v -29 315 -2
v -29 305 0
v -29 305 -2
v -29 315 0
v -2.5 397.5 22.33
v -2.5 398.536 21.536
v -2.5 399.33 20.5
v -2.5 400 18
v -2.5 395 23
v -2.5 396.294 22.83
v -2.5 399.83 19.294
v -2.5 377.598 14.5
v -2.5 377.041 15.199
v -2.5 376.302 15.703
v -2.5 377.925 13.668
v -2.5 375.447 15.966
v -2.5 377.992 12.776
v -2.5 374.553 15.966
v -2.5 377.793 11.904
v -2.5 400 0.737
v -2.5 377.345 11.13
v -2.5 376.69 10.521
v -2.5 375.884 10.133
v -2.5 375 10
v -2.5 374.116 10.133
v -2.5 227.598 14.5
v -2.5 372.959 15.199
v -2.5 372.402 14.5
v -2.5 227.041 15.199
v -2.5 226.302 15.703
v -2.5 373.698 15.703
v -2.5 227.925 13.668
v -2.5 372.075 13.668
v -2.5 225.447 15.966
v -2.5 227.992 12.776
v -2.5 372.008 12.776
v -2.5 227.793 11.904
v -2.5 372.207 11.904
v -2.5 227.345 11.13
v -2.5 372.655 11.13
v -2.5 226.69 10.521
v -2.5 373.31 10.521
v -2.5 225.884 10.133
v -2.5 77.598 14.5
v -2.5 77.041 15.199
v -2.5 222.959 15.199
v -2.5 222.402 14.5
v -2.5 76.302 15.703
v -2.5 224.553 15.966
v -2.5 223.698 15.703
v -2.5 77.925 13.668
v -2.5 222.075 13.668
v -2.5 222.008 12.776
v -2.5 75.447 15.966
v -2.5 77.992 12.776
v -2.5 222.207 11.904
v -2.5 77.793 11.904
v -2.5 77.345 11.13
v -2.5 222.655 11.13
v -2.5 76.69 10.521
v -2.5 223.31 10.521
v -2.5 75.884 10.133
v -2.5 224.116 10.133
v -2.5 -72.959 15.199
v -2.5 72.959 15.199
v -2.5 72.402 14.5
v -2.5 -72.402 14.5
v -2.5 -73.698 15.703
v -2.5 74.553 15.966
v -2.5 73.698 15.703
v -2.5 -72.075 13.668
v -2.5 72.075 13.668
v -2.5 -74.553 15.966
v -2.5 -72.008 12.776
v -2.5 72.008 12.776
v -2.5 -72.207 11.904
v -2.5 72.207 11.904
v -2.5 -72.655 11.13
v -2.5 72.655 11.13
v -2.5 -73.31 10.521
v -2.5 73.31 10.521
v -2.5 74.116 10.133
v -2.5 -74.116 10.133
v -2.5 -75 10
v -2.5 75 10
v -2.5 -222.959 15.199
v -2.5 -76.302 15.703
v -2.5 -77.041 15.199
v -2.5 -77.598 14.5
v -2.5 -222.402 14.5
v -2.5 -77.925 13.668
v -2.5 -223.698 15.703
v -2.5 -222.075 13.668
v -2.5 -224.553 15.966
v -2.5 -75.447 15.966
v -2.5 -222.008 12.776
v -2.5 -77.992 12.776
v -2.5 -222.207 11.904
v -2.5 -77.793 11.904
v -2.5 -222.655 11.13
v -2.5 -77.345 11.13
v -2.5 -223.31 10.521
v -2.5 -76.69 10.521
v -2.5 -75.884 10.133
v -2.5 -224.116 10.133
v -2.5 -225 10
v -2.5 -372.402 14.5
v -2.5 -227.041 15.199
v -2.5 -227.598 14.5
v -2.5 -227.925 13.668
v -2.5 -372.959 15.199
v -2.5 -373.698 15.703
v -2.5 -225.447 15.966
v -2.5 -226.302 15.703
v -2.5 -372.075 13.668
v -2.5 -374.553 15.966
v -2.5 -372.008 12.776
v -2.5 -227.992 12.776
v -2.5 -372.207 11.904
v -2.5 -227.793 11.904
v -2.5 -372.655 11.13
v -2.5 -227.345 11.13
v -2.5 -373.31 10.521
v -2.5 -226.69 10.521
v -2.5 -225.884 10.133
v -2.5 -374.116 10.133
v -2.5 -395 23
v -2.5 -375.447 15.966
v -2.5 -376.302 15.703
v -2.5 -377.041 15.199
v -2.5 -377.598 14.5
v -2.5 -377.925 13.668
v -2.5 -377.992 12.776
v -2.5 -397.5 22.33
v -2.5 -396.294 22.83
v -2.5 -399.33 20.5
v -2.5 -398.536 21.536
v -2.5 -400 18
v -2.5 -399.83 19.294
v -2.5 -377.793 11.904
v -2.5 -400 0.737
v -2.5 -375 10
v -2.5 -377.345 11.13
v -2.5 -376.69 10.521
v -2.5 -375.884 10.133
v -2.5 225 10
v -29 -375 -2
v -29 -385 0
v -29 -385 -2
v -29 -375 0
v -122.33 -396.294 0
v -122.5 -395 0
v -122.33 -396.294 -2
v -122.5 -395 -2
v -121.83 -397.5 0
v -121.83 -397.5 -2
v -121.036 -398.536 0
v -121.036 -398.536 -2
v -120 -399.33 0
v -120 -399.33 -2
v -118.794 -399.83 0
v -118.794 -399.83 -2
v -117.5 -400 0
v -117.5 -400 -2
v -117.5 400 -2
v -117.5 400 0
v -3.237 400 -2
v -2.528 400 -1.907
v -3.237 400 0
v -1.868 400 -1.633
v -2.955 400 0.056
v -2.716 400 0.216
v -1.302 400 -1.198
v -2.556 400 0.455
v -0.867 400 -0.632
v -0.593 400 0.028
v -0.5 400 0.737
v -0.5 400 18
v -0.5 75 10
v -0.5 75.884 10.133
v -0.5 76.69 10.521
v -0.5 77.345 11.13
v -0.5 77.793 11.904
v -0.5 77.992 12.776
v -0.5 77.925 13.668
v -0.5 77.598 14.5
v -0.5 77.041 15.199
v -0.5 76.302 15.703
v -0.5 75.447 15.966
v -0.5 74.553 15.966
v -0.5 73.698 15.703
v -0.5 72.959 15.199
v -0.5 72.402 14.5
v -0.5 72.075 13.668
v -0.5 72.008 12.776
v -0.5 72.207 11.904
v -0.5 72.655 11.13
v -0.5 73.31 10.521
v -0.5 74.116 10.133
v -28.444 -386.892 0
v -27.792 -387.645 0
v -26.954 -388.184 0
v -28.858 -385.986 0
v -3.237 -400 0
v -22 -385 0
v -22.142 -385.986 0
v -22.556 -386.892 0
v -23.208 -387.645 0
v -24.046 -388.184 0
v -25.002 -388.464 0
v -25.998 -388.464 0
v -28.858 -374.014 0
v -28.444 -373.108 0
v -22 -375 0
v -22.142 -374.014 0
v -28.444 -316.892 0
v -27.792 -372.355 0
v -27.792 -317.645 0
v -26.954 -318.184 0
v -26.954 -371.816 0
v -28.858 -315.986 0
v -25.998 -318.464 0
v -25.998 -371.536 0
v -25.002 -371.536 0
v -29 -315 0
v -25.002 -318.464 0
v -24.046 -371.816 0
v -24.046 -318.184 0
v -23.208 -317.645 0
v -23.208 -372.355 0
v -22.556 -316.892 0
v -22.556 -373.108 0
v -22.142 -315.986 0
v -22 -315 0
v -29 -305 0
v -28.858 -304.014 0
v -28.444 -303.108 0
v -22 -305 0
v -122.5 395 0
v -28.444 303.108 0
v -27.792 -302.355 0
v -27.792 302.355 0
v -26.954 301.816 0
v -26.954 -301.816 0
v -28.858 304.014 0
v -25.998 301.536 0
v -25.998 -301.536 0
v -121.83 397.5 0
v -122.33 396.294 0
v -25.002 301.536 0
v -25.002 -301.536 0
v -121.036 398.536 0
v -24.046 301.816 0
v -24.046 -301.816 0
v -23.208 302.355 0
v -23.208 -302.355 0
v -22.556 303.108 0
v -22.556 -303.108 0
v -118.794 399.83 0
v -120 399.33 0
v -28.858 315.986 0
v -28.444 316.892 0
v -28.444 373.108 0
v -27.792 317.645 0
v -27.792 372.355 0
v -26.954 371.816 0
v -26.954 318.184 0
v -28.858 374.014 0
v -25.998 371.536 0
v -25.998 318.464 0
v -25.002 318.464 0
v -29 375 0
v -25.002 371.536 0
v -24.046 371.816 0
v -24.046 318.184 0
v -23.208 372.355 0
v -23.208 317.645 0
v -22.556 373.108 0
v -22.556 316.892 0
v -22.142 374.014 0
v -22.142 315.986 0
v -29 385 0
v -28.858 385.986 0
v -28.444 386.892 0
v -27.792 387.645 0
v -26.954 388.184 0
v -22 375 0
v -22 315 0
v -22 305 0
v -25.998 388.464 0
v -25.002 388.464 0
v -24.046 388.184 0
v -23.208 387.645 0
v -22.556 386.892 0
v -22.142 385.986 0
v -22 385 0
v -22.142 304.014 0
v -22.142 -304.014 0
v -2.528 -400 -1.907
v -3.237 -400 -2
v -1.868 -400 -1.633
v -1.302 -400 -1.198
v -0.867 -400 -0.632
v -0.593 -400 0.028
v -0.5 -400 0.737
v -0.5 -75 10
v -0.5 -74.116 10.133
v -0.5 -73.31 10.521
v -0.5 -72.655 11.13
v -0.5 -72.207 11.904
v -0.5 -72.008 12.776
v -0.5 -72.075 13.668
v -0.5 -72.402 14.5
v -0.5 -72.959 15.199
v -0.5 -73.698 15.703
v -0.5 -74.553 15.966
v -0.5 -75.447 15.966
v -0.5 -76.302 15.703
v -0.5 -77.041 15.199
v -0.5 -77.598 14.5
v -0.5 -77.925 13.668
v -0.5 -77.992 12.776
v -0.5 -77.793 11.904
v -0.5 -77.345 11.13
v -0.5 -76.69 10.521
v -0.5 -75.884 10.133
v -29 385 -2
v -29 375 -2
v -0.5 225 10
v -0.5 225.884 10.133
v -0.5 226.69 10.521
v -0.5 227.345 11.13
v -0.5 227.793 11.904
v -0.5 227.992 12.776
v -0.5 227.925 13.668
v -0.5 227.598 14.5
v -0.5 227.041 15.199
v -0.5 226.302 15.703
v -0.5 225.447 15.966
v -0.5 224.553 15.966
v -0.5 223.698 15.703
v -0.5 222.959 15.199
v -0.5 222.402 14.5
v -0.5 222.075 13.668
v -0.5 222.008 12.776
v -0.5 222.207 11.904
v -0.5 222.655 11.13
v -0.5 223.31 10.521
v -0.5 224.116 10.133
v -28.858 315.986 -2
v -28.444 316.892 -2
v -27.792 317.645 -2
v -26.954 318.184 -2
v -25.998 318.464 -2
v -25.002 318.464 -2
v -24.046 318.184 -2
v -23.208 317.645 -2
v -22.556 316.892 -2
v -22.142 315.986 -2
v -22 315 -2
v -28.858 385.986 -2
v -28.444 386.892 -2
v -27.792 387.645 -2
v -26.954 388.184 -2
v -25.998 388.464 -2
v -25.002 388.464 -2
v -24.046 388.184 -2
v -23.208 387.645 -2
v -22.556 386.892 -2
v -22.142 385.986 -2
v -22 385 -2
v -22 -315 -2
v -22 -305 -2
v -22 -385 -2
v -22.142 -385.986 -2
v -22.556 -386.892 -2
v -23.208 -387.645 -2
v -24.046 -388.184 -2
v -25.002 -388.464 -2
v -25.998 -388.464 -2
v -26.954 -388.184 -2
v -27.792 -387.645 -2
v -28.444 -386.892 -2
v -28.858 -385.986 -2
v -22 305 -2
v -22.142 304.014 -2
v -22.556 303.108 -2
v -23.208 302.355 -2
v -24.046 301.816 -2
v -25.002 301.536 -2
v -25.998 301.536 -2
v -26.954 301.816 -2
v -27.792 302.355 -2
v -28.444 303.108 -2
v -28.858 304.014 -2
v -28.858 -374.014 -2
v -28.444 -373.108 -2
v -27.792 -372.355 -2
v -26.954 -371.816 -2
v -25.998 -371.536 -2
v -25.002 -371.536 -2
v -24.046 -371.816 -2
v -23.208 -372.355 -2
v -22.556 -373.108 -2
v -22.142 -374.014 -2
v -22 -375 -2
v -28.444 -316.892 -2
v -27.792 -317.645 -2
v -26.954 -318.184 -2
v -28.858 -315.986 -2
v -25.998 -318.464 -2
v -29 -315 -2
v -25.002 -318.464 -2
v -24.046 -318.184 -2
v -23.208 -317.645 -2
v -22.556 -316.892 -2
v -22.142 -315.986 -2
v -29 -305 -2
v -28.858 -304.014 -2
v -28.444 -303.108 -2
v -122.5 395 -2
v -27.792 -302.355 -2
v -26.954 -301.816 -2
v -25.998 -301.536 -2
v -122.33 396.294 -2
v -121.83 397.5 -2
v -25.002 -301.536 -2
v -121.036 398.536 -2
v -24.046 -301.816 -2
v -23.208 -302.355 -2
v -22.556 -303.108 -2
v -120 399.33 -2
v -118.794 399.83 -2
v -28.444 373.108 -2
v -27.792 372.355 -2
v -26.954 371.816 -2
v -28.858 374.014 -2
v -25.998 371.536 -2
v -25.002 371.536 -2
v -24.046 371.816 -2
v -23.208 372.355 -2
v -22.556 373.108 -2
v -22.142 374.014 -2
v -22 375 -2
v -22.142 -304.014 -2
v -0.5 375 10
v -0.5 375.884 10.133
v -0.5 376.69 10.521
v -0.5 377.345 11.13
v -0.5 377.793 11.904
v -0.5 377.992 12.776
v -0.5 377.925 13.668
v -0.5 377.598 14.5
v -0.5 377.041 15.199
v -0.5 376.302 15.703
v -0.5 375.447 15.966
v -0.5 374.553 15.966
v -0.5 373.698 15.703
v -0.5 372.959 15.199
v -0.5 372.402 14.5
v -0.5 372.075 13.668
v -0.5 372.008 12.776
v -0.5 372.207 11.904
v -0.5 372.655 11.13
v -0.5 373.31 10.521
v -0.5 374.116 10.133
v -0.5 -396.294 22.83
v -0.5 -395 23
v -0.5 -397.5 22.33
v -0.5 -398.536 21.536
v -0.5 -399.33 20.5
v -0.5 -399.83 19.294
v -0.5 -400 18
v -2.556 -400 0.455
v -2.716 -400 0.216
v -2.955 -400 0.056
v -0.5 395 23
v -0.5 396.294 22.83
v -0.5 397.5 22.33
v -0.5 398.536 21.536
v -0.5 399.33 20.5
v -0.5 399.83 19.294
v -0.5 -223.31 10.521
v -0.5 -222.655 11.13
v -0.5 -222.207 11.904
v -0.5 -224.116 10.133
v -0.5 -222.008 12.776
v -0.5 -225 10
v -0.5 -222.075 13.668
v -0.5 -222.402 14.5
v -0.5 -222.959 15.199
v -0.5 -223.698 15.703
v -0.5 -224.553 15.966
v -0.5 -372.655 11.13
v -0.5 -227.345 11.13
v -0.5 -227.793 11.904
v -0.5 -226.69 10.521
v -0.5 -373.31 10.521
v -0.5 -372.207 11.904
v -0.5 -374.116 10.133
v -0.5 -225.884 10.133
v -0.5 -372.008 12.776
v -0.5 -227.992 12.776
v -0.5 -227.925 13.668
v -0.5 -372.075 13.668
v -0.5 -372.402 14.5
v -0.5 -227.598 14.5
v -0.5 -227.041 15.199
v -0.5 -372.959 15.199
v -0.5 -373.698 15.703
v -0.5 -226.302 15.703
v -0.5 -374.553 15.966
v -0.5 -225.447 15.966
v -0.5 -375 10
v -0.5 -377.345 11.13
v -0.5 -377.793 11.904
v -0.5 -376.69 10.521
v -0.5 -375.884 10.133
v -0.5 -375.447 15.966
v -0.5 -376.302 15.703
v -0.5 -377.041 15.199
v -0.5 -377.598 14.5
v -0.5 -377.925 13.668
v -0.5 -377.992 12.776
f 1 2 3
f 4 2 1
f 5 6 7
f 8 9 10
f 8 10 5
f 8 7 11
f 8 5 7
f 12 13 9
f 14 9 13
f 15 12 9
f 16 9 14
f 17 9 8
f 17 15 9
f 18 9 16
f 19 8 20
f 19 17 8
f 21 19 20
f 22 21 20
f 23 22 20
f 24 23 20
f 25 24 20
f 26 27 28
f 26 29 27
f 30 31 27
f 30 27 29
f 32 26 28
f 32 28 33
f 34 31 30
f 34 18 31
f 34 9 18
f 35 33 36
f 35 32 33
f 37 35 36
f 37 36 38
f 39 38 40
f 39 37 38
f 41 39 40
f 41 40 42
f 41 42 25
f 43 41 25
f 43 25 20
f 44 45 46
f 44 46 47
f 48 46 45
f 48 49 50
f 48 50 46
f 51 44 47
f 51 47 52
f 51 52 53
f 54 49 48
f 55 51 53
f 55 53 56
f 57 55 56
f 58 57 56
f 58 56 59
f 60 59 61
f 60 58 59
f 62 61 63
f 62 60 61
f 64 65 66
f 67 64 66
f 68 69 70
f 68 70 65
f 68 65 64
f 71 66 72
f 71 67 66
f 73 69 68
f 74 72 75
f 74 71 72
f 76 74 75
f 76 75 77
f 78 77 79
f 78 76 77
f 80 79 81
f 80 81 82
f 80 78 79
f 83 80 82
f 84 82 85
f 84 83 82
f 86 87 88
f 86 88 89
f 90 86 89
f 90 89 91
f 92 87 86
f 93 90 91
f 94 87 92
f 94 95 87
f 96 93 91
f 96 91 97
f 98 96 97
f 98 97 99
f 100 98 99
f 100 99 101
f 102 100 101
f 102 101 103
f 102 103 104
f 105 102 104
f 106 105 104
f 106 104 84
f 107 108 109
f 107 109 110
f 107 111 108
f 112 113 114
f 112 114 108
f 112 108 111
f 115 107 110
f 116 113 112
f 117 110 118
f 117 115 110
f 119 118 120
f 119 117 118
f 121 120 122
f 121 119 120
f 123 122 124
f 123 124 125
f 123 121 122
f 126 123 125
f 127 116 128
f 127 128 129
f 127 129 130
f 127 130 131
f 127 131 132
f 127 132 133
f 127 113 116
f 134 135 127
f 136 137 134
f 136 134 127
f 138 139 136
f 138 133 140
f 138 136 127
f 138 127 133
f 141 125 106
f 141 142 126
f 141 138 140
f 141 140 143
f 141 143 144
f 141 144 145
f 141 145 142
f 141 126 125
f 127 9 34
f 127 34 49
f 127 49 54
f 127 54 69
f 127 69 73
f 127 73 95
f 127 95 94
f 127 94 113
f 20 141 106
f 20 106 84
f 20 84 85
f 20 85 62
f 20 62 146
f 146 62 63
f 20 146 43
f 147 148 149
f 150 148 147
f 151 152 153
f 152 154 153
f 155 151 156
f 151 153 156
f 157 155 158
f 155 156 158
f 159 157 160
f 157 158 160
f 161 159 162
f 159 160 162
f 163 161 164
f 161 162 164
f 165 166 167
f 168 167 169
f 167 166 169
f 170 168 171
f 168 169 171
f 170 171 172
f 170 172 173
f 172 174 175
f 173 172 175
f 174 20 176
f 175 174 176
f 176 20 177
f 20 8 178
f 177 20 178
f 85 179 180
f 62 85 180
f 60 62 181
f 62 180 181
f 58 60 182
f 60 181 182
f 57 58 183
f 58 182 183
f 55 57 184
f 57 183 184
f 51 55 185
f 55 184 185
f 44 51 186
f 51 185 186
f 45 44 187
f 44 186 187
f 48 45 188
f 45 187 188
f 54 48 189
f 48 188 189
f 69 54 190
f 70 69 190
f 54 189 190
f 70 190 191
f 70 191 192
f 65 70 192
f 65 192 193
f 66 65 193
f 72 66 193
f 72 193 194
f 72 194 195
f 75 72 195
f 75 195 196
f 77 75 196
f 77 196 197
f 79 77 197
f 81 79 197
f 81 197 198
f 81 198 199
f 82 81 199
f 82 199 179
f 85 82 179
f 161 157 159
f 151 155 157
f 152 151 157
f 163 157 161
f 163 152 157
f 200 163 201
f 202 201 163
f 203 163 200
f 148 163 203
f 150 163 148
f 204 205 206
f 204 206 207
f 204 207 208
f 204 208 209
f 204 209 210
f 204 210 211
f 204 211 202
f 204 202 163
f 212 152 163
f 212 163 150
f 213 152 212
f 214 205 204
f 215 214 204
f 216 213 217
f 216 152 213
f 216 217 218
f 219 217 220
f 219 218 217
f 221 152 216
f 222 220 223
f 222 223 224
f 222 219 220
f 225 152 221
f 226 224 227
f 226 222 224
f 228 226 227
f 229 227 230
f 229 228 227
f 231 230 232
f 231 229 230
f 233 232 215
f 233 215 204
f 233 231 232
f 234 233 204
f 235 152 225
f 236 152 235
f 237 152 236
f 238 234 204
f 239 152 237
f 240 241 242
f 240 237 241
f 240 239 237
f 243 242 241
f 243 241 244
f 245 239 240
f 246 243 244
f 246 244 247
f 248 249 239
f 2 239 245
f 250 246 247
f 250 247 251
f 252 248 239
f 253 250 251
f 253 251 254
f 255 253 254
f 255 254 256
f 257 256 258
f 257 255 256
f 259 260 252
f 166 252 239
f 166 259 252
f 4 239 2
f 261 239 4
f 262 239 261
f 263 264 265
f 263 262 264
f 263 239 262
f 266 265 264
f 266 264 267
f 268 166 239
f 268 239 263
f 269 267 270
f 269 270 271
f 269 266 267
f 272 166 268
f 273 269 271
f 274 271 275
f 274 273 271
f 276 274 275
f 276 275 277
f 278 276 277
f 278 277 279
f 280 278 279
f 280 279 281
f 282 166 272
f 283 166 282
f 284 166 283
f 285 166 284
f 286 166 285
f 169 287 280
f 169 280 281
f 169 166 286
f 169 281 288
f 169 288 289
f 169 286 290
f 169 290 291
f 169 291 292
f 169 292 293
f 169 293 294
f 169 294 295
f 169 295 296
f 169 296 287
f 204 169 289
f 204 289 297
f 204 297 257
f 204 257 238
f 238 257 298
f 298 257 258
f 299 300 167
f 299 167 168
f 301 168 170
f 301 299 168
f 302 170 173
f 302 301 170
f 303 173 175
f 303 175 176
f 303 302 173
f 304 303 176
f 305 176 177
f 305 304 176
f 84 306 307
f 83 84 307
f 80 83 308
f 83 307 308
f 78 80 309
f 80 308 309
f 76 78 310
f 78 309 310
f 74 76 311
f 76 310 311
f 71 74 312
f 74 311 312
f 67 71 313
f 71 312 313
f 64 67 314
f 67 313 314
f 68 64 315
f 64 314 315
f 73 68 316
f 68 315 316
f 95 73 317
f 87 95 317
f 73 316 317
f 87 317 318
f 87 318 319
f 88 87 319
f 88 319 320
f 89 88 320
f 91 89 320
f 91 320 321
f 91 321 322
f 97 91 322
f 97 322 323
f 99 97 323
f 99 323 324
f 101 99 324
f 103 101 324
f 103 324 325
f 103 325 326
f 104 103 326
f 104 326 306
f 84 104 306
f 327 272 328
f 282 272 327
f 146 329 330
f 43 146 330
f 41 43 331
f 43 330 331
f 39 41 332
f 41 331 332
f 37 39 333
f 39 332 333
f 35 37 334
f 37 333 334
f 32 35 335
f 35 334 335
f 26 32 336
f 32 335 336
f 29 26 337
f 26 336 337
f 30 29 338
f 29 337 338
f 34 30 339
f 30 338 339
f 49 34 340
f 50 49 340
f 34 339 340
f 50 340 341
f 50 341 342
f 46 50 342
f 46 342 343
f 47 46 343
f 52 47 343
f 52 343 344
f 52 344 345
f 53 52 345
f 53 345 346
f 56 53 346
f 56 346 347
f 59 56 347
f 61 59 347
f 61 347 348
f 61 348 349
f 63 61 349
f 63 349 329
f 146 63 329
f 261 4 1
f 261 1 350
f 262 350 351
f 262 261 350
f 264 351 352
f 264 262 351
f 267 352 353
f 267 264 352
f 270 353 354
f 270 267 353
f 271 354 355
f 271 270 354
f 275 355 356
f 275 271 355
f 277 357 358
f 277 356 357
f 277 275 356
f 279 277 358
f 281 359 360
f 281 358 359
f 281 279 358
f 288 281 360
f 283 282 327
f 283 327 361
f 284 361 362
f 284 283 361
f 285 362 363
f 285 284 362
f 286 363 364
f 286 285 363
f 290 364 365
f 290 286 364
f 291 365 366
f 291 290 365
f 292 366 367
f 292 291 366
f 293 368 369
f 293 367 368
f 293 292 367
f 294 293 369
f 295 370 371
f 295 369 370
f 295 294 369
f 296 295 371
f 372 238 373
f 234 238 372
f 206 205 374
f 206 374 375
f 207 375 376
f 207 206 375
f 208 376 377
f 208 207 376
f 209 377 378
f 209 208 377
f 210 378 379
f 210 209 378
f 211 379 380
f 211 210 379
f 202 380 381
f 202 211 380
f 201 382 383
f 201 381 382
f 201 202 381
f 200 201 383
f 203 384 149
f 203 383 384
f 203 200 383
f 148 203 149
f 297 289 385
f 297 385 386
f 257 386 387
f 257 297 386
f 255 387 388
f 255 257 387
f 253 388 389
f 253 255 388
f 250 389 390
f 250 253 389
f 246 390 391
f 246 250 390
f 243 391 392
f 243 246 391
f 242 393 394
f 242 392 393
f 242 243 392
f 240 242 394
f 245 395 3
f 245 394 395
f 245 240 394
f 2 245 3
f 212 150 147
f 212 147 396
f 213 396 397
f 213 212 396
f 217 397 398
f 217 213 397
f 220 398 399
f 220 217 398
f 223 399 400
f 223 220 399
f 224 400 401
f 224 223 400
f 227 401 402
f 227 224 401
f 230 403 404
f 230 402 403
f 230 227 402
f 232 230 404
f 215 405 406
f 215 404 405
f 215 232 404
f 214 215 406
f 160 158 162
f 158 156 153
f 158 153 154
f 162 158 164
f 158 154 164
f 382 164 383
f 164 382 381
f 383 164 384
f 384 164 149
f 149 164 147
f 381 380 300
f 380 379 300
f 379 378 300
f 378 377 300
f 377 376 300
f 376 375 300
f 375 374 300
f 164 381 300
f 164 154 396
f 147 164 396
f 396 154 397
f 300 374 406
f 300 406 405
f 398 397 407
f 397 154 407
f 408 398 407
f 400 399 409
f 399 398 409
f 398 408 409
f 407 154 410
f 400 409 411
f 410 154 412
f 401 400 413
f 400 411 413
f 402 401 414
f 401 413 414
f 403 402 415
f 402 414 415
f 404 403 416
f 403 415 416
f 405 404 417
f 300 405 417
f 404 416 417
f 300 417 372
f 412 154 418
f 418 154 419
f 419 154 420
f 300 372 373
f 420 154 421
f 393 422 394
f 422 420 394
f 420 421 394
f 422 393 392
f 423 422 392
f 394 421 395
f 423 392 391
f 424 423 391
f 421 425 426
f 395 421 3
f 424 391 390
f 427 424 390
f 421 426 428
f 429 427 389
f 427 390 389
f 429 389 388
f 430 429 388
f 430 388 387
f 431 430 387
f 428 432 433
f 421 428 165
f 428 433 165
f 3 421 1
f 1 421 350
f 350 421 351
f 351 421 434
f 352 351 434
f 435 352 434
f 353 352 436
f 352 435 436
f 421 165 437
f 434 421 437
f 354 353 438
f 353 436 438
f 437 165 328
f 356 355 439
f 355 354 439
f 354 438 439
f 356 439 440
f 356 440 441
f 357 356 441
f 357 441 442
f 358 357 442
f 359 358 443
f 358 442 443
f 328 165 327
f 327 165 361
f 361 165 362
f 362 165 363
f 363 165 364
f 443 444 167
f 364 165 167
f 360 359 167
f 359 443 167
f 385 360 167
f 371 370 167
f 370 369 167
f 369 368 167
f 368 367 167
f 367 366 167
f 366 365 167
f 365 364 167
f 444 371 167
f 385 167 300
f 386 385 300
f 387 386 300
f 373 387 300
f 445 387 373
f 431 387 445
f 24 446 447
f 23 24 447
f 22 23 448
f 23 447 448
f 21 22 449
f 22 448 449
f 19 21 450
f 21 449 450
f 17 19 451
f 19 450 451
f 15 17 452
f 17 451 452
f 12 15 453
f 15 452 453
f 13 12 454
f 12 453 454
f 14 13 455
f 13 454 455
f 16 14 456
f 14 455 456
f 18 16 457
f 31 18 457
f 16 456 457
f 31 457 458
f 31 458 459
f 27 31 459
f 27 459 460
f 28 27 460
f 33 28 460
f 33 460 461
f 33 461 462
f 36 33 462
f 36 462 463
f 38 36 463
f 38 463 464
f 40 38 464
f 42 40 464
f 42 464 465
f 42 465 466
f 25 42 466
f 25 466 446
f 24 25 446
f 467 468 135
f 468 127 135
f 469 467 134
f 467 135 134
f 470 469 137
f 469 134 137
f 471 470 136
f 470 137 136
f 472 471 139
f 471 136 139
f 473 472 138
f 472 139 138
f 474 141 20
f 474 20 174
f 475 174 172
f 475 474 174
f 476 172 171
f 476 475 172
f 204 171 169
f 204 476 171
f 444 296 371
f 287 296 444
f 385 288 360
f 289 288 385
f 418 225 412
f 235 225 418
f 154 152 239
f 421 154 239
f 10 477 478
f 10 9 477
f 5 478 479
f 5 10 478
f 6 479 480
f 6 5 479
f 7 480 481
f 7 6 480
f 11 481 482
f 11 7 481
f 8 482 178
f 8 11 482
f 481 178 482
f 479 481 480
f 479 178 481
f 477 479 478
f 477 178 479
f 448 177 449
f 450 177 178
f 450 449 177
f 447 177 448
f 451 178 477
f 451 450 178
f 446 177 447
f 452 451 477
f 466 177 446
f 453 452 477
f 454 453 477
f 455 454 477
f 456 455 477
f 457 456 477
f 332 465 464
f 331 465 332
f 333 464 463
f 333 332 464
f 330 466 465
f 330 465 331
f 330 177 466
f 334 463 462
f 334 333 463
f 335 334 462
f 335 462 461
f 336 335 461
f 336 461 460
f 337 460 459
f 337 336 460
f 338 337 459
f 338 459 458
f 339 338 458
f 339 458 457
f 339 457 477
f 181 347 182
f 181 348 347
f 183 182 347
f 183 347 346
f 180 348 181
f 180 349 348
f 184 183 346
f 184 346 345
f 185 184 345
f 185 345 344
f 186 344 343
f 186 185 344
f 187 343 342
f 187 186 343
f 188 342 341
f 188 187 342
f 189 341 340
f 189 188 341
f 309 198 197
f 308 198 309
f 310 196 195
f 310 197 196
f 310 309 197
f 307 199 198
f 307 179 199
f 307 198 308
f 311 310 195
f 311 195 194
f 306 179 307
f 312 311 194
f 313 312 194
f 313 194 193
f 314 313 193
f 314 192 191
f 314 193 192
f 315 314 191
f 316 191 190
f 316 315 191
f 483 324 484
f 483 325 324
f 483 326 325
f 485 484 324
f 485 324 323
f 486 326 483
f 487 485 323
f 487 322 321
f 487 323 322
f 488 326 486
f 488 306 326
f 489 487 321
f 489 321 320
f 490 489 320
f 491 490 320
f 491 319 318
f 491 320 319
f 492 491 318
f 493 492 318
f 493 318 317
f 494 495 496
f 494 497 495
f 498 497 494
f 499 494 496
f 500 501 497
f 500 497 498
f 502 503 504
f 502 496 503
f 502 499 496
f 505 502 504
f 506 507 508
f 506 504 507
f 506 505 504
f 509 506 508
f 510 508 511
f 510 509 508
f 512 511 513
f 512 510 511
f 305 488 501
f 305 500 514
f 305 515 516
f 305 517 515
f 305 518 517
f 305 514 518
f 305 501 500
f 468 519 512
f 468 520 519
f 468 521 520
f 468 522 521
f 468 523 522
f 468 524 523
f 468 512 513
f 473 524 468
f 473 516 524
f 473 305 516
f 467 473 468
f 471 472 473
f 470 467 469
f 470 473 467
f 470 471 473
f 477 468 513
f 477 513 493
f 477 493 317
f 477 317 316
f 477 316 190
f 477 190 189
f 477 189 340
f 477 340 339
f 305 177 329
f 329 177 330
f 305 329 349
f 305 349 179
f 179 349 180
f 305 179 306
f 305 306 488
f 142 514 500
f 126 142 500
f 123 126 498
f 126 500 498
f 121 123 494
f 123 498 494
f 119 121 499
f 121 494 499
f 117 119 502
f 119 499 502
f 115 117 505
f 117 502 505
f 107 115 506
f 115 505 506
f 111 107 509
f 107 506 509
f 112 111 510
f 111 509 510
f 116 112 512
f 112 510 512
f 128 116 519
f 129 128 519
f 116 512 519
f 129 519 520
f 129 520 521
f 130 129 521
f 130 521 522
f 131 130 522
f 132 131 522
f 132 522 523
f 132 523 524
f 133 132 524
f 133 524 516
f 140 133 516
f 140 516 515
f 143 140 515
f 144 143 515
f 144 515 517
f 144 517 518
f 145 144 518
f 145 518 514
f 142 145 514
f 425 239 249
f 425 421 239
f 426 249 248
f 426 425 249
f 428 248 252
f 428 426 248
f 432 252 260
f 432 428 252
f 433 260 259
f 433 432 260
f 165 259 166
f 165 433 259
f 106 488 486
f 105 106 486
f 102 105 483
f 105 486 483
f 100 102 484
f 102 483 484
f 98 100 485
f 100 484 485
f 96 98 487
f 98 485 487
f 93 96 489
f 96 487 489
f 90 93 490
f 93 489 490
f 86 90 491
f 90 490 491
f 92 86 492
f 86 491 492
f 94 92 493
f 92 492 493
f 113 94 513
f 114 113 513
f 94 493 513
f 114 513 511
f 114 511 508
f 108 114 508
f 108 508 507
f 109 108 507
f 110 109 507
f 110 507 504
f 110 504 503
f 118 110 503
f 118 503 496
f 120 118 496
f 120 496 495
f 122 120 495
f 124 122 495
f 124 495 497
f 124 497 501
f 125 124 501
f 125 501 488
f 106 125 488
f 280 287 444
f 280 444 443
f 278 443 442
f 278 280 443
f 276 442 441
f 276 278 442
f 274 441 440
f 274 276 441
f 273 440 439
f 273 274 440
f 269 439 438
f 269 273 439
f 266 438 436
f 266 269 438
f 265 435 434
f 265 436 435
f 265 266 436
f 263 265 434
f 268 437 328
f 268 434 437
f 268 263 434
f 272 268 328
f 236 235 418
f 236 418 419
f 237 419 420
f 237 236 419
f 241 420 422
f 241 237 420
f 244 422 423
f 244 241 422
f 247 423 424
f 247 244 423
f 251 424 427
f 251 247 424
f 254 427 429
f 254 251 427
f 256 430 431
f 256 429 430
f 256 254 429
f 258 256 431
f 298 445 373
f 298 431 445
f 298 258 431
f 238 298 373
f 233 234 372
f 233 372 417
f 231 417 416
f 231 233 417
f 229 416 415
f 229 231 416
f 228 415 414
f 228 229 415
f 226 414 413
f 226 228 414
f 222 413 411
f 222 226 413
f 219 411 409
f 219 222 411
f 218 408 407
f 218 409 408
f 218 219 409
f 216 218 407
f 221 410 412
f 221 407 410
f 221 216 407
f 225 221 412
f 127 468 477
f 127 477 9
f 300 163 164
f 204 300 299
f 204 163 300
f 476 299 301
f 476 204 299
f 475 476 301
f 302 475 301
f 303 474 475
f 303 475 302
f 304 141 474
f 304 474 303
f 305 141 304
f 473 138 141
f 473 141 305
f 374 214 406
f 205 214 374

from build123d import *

# Parameters (mm, degrees)
SKETCH_1_W                       = 245
SKETCH_1_H                       = 800
SM_BASE_FLANGE_1_DEPTH           = 2
FILLET_1_R                       = 5
SKETCH_2_W                       = 1
SKETCH_2_H                       = 854.013811654
CUT_EXTRUDE_1_DEPTH              = 10
SKETCH_3_W                       = 130
SKETCH_3_H                       = 800.320249097
CUT_EXTRUDE_2_DEPTH              = 10
SM_EDGE_FLANGE_1_STRIP_W         = 9.4732
SM_EDGE_FLANGE_1_STRIP_H         = 2
SM_EDGE_FLANGE_1_STRIP_CUT_DEPTH = 800
SM_EDGE_FLANGE_1_DEPTH           = 800
FILLET_2_R                       = 5
CUT_EXTRUDE_3_DEPTH              = 10
HOLE_WIZARD_6_0_6_1_D            = 6
PATTERN_LINEAR_1_COUNT           = 6
PATTERN_LINEAR_1_PITCH           = 150


# Sheet-metal steps are written as plain solids
with BuildPart() as part:
    # Sketch 1 → 基体-法兰1 (new body)
    with BuildSketch(Plane.XY):
        Rectangle(SKETCH_1_W, SKETCH_1_H)
    extrude(amount=-SM_BASE_FLANGE_1_DEPTH)

    # 圆角1
    fillet_1_edges = [part.edges().sort_by_distance(p)[0] for p in [
        (-122.5, 400, -1),
        (122.5, 400, -1),
        (122.5, -400, -1),
        (-122.5, -400, -1),
    ]]
    fillet(fillet_1_edges, radius=FILLET_1_R)

    # Sketch 2 → 切除-拉伸1 (cut)
    with BuildSketch(Plane.XY):
        Rectangle(SKETCH_2_W, SKETCH_2_H)
    extrude(amount=-CUT_EXTRUDE_1_DEPTH, mode=Mode.SUBTRACT)


with BuildPart() as cut_extrude_1_piece_1:
    # of the separate pieces the step leaves, piece 1, a body of its own (cut_extrude_1_pieces)
    add(part.part.solids().sort_by_distance((-0.5, -400, 0))[0])

    # 边线-法兰1 strip (across the edge) → 边线-法兰1 strip cut (cut)
    with BuildSketch(Plane(origin=(-0.5, -400, 0), x_dir=(-1, 0, 0), z_dir=(0, 1, 0))):
        with Locations((-2, -1)):
            Rectangle(SM_EDGE_FLANGE_1_STRIP_W, SM_EDGE_FLANGE_1_STRIP_H)
    extrude(amount=SM_EDGE_FLANGE_1_STRIP_CUT_DEPTH, mode=Mode.SUBTRACT)

    # 边线-法兰1 section (across the edge) → 边线-法兰1 (add)
    with BuildSketch(Plane(origin=(-0.5, -400, 0), x_dir=(-1, 0, 0), z_dir=(0, 1, 0))):
        with BuildLine():
            Line((0, 0.7366), (0, 23))
            Line((0, 23), (2, 23))
            Line((2, 23), (2, 0.7366))
            ThreePointArc((2, 0.7366), (2.215745145, 0.215745145), (2.7366, 0))
            Line((2.7366, 0), (2.7366, -2))
            ThreePointArc((2.7366, -2), (0.801531583, -1.198468417), (0, 0.7366))
        make_face()
    extrude(amount=SM_EDGE_FLANGE_1_DEPTH)

    # 圆角2
    fillet_2_edges = [cut_extrude_1_piece_1.edges().sort_by_distance(p)[0] for p in [
        (-1.5, -400, 23),
        (-1.5, 400, 23),
    ]]
    fillet(fillet_2_edges, radius=FILLET_2_R)

    # 草图9 → 切除-拉伸3 (cut)
    with BuildSketch(Plane.XY):
        with BuildLine():
            Line((-22, 385), (-22, 375))
            ThreePointArc((-22, 375), (-25.5, 371.5), (-29, 375))
            Line((-29, 375), (-29, 385))
            ThreePointArc((-29, 385), (-25.5, 388.5), (-22, 385))
        make_face()
        with BuildLine():
            Line((-22, 315), (-22, 305))
            ThreePointArc((-22, 305), (-25.5, 301.5), (-29, 305))
            Line((-29, 305), (-29, 315))
            ThreePointArc((-29, 315), (-25.5, 318.5), (-22, 315))
        make_face()
        with BuildLine():
            Line((-29, -385), (-29, -375))
            ThreePointArc((-29, -375), (-25.5, -371.5), (-22, -375))
            Line((-22, -375), (-22, -385))
            ThreePointArc((-22, -385), (-25.5, -388.5), (-29, -385))
        make_face()
        with BuildLine():
            Line((-22, -305), (-22, -315))
            ThreePointArc((-22, -315), (-25.5, -318.5), (-29, -315))
            Line((-29, -315), (-29, -305))
            ThreePointArc((-29, -305), (-25.5, -301.5), (-22, -305))
        make_face()
    extrude(amount=-CUT_EXTRUDE_3_DEPTH, mode=Mode.SUBTRACT)

    # Ø6.0 (6) 直径孔1 (through all)
    with Locations(Plane.ZY.offset(2.5)):
        with Locations((13, 375)):
            hole_wizard_6_0_6_1 = Hole(HOLE_WIZARD_6_0_6_1_D / 2)

    # 阵列(线性)1: Ø6.0 (6) 直径孔1 ×6
    with Locations(*[(0, -i * PATTERN_LINEAR_1_PITCH, 0) for i in range(1, PATTERN_LINEAR_1_COUNT)]):
        add(hole_wizard_6_0_6_1, mode=Mode.SUBTRACT)


with BuildPart() as cut_extrude_1_piece_2:
    # of the separate pieces the step leaves, piece 2, a body of its own (cut_extrude_1_pieces)
    add(part.part.solids().sort_by_distance((117.5, -400, 0))[0])

    # Sketch 3 → 切除-拉伸2 (cut)
    with BuildSketch(Plane.XY):
        with Locations((65.5, -0.160124549)):
            Rectangle(SKETCH_3_W, SKETCH_3_H)
    extrude(amount=-CUT_EXTRUDE_2_DEPTH, mode=Mode.SUBTRACT)


solid = cut_extrude_1_piece_1.part
